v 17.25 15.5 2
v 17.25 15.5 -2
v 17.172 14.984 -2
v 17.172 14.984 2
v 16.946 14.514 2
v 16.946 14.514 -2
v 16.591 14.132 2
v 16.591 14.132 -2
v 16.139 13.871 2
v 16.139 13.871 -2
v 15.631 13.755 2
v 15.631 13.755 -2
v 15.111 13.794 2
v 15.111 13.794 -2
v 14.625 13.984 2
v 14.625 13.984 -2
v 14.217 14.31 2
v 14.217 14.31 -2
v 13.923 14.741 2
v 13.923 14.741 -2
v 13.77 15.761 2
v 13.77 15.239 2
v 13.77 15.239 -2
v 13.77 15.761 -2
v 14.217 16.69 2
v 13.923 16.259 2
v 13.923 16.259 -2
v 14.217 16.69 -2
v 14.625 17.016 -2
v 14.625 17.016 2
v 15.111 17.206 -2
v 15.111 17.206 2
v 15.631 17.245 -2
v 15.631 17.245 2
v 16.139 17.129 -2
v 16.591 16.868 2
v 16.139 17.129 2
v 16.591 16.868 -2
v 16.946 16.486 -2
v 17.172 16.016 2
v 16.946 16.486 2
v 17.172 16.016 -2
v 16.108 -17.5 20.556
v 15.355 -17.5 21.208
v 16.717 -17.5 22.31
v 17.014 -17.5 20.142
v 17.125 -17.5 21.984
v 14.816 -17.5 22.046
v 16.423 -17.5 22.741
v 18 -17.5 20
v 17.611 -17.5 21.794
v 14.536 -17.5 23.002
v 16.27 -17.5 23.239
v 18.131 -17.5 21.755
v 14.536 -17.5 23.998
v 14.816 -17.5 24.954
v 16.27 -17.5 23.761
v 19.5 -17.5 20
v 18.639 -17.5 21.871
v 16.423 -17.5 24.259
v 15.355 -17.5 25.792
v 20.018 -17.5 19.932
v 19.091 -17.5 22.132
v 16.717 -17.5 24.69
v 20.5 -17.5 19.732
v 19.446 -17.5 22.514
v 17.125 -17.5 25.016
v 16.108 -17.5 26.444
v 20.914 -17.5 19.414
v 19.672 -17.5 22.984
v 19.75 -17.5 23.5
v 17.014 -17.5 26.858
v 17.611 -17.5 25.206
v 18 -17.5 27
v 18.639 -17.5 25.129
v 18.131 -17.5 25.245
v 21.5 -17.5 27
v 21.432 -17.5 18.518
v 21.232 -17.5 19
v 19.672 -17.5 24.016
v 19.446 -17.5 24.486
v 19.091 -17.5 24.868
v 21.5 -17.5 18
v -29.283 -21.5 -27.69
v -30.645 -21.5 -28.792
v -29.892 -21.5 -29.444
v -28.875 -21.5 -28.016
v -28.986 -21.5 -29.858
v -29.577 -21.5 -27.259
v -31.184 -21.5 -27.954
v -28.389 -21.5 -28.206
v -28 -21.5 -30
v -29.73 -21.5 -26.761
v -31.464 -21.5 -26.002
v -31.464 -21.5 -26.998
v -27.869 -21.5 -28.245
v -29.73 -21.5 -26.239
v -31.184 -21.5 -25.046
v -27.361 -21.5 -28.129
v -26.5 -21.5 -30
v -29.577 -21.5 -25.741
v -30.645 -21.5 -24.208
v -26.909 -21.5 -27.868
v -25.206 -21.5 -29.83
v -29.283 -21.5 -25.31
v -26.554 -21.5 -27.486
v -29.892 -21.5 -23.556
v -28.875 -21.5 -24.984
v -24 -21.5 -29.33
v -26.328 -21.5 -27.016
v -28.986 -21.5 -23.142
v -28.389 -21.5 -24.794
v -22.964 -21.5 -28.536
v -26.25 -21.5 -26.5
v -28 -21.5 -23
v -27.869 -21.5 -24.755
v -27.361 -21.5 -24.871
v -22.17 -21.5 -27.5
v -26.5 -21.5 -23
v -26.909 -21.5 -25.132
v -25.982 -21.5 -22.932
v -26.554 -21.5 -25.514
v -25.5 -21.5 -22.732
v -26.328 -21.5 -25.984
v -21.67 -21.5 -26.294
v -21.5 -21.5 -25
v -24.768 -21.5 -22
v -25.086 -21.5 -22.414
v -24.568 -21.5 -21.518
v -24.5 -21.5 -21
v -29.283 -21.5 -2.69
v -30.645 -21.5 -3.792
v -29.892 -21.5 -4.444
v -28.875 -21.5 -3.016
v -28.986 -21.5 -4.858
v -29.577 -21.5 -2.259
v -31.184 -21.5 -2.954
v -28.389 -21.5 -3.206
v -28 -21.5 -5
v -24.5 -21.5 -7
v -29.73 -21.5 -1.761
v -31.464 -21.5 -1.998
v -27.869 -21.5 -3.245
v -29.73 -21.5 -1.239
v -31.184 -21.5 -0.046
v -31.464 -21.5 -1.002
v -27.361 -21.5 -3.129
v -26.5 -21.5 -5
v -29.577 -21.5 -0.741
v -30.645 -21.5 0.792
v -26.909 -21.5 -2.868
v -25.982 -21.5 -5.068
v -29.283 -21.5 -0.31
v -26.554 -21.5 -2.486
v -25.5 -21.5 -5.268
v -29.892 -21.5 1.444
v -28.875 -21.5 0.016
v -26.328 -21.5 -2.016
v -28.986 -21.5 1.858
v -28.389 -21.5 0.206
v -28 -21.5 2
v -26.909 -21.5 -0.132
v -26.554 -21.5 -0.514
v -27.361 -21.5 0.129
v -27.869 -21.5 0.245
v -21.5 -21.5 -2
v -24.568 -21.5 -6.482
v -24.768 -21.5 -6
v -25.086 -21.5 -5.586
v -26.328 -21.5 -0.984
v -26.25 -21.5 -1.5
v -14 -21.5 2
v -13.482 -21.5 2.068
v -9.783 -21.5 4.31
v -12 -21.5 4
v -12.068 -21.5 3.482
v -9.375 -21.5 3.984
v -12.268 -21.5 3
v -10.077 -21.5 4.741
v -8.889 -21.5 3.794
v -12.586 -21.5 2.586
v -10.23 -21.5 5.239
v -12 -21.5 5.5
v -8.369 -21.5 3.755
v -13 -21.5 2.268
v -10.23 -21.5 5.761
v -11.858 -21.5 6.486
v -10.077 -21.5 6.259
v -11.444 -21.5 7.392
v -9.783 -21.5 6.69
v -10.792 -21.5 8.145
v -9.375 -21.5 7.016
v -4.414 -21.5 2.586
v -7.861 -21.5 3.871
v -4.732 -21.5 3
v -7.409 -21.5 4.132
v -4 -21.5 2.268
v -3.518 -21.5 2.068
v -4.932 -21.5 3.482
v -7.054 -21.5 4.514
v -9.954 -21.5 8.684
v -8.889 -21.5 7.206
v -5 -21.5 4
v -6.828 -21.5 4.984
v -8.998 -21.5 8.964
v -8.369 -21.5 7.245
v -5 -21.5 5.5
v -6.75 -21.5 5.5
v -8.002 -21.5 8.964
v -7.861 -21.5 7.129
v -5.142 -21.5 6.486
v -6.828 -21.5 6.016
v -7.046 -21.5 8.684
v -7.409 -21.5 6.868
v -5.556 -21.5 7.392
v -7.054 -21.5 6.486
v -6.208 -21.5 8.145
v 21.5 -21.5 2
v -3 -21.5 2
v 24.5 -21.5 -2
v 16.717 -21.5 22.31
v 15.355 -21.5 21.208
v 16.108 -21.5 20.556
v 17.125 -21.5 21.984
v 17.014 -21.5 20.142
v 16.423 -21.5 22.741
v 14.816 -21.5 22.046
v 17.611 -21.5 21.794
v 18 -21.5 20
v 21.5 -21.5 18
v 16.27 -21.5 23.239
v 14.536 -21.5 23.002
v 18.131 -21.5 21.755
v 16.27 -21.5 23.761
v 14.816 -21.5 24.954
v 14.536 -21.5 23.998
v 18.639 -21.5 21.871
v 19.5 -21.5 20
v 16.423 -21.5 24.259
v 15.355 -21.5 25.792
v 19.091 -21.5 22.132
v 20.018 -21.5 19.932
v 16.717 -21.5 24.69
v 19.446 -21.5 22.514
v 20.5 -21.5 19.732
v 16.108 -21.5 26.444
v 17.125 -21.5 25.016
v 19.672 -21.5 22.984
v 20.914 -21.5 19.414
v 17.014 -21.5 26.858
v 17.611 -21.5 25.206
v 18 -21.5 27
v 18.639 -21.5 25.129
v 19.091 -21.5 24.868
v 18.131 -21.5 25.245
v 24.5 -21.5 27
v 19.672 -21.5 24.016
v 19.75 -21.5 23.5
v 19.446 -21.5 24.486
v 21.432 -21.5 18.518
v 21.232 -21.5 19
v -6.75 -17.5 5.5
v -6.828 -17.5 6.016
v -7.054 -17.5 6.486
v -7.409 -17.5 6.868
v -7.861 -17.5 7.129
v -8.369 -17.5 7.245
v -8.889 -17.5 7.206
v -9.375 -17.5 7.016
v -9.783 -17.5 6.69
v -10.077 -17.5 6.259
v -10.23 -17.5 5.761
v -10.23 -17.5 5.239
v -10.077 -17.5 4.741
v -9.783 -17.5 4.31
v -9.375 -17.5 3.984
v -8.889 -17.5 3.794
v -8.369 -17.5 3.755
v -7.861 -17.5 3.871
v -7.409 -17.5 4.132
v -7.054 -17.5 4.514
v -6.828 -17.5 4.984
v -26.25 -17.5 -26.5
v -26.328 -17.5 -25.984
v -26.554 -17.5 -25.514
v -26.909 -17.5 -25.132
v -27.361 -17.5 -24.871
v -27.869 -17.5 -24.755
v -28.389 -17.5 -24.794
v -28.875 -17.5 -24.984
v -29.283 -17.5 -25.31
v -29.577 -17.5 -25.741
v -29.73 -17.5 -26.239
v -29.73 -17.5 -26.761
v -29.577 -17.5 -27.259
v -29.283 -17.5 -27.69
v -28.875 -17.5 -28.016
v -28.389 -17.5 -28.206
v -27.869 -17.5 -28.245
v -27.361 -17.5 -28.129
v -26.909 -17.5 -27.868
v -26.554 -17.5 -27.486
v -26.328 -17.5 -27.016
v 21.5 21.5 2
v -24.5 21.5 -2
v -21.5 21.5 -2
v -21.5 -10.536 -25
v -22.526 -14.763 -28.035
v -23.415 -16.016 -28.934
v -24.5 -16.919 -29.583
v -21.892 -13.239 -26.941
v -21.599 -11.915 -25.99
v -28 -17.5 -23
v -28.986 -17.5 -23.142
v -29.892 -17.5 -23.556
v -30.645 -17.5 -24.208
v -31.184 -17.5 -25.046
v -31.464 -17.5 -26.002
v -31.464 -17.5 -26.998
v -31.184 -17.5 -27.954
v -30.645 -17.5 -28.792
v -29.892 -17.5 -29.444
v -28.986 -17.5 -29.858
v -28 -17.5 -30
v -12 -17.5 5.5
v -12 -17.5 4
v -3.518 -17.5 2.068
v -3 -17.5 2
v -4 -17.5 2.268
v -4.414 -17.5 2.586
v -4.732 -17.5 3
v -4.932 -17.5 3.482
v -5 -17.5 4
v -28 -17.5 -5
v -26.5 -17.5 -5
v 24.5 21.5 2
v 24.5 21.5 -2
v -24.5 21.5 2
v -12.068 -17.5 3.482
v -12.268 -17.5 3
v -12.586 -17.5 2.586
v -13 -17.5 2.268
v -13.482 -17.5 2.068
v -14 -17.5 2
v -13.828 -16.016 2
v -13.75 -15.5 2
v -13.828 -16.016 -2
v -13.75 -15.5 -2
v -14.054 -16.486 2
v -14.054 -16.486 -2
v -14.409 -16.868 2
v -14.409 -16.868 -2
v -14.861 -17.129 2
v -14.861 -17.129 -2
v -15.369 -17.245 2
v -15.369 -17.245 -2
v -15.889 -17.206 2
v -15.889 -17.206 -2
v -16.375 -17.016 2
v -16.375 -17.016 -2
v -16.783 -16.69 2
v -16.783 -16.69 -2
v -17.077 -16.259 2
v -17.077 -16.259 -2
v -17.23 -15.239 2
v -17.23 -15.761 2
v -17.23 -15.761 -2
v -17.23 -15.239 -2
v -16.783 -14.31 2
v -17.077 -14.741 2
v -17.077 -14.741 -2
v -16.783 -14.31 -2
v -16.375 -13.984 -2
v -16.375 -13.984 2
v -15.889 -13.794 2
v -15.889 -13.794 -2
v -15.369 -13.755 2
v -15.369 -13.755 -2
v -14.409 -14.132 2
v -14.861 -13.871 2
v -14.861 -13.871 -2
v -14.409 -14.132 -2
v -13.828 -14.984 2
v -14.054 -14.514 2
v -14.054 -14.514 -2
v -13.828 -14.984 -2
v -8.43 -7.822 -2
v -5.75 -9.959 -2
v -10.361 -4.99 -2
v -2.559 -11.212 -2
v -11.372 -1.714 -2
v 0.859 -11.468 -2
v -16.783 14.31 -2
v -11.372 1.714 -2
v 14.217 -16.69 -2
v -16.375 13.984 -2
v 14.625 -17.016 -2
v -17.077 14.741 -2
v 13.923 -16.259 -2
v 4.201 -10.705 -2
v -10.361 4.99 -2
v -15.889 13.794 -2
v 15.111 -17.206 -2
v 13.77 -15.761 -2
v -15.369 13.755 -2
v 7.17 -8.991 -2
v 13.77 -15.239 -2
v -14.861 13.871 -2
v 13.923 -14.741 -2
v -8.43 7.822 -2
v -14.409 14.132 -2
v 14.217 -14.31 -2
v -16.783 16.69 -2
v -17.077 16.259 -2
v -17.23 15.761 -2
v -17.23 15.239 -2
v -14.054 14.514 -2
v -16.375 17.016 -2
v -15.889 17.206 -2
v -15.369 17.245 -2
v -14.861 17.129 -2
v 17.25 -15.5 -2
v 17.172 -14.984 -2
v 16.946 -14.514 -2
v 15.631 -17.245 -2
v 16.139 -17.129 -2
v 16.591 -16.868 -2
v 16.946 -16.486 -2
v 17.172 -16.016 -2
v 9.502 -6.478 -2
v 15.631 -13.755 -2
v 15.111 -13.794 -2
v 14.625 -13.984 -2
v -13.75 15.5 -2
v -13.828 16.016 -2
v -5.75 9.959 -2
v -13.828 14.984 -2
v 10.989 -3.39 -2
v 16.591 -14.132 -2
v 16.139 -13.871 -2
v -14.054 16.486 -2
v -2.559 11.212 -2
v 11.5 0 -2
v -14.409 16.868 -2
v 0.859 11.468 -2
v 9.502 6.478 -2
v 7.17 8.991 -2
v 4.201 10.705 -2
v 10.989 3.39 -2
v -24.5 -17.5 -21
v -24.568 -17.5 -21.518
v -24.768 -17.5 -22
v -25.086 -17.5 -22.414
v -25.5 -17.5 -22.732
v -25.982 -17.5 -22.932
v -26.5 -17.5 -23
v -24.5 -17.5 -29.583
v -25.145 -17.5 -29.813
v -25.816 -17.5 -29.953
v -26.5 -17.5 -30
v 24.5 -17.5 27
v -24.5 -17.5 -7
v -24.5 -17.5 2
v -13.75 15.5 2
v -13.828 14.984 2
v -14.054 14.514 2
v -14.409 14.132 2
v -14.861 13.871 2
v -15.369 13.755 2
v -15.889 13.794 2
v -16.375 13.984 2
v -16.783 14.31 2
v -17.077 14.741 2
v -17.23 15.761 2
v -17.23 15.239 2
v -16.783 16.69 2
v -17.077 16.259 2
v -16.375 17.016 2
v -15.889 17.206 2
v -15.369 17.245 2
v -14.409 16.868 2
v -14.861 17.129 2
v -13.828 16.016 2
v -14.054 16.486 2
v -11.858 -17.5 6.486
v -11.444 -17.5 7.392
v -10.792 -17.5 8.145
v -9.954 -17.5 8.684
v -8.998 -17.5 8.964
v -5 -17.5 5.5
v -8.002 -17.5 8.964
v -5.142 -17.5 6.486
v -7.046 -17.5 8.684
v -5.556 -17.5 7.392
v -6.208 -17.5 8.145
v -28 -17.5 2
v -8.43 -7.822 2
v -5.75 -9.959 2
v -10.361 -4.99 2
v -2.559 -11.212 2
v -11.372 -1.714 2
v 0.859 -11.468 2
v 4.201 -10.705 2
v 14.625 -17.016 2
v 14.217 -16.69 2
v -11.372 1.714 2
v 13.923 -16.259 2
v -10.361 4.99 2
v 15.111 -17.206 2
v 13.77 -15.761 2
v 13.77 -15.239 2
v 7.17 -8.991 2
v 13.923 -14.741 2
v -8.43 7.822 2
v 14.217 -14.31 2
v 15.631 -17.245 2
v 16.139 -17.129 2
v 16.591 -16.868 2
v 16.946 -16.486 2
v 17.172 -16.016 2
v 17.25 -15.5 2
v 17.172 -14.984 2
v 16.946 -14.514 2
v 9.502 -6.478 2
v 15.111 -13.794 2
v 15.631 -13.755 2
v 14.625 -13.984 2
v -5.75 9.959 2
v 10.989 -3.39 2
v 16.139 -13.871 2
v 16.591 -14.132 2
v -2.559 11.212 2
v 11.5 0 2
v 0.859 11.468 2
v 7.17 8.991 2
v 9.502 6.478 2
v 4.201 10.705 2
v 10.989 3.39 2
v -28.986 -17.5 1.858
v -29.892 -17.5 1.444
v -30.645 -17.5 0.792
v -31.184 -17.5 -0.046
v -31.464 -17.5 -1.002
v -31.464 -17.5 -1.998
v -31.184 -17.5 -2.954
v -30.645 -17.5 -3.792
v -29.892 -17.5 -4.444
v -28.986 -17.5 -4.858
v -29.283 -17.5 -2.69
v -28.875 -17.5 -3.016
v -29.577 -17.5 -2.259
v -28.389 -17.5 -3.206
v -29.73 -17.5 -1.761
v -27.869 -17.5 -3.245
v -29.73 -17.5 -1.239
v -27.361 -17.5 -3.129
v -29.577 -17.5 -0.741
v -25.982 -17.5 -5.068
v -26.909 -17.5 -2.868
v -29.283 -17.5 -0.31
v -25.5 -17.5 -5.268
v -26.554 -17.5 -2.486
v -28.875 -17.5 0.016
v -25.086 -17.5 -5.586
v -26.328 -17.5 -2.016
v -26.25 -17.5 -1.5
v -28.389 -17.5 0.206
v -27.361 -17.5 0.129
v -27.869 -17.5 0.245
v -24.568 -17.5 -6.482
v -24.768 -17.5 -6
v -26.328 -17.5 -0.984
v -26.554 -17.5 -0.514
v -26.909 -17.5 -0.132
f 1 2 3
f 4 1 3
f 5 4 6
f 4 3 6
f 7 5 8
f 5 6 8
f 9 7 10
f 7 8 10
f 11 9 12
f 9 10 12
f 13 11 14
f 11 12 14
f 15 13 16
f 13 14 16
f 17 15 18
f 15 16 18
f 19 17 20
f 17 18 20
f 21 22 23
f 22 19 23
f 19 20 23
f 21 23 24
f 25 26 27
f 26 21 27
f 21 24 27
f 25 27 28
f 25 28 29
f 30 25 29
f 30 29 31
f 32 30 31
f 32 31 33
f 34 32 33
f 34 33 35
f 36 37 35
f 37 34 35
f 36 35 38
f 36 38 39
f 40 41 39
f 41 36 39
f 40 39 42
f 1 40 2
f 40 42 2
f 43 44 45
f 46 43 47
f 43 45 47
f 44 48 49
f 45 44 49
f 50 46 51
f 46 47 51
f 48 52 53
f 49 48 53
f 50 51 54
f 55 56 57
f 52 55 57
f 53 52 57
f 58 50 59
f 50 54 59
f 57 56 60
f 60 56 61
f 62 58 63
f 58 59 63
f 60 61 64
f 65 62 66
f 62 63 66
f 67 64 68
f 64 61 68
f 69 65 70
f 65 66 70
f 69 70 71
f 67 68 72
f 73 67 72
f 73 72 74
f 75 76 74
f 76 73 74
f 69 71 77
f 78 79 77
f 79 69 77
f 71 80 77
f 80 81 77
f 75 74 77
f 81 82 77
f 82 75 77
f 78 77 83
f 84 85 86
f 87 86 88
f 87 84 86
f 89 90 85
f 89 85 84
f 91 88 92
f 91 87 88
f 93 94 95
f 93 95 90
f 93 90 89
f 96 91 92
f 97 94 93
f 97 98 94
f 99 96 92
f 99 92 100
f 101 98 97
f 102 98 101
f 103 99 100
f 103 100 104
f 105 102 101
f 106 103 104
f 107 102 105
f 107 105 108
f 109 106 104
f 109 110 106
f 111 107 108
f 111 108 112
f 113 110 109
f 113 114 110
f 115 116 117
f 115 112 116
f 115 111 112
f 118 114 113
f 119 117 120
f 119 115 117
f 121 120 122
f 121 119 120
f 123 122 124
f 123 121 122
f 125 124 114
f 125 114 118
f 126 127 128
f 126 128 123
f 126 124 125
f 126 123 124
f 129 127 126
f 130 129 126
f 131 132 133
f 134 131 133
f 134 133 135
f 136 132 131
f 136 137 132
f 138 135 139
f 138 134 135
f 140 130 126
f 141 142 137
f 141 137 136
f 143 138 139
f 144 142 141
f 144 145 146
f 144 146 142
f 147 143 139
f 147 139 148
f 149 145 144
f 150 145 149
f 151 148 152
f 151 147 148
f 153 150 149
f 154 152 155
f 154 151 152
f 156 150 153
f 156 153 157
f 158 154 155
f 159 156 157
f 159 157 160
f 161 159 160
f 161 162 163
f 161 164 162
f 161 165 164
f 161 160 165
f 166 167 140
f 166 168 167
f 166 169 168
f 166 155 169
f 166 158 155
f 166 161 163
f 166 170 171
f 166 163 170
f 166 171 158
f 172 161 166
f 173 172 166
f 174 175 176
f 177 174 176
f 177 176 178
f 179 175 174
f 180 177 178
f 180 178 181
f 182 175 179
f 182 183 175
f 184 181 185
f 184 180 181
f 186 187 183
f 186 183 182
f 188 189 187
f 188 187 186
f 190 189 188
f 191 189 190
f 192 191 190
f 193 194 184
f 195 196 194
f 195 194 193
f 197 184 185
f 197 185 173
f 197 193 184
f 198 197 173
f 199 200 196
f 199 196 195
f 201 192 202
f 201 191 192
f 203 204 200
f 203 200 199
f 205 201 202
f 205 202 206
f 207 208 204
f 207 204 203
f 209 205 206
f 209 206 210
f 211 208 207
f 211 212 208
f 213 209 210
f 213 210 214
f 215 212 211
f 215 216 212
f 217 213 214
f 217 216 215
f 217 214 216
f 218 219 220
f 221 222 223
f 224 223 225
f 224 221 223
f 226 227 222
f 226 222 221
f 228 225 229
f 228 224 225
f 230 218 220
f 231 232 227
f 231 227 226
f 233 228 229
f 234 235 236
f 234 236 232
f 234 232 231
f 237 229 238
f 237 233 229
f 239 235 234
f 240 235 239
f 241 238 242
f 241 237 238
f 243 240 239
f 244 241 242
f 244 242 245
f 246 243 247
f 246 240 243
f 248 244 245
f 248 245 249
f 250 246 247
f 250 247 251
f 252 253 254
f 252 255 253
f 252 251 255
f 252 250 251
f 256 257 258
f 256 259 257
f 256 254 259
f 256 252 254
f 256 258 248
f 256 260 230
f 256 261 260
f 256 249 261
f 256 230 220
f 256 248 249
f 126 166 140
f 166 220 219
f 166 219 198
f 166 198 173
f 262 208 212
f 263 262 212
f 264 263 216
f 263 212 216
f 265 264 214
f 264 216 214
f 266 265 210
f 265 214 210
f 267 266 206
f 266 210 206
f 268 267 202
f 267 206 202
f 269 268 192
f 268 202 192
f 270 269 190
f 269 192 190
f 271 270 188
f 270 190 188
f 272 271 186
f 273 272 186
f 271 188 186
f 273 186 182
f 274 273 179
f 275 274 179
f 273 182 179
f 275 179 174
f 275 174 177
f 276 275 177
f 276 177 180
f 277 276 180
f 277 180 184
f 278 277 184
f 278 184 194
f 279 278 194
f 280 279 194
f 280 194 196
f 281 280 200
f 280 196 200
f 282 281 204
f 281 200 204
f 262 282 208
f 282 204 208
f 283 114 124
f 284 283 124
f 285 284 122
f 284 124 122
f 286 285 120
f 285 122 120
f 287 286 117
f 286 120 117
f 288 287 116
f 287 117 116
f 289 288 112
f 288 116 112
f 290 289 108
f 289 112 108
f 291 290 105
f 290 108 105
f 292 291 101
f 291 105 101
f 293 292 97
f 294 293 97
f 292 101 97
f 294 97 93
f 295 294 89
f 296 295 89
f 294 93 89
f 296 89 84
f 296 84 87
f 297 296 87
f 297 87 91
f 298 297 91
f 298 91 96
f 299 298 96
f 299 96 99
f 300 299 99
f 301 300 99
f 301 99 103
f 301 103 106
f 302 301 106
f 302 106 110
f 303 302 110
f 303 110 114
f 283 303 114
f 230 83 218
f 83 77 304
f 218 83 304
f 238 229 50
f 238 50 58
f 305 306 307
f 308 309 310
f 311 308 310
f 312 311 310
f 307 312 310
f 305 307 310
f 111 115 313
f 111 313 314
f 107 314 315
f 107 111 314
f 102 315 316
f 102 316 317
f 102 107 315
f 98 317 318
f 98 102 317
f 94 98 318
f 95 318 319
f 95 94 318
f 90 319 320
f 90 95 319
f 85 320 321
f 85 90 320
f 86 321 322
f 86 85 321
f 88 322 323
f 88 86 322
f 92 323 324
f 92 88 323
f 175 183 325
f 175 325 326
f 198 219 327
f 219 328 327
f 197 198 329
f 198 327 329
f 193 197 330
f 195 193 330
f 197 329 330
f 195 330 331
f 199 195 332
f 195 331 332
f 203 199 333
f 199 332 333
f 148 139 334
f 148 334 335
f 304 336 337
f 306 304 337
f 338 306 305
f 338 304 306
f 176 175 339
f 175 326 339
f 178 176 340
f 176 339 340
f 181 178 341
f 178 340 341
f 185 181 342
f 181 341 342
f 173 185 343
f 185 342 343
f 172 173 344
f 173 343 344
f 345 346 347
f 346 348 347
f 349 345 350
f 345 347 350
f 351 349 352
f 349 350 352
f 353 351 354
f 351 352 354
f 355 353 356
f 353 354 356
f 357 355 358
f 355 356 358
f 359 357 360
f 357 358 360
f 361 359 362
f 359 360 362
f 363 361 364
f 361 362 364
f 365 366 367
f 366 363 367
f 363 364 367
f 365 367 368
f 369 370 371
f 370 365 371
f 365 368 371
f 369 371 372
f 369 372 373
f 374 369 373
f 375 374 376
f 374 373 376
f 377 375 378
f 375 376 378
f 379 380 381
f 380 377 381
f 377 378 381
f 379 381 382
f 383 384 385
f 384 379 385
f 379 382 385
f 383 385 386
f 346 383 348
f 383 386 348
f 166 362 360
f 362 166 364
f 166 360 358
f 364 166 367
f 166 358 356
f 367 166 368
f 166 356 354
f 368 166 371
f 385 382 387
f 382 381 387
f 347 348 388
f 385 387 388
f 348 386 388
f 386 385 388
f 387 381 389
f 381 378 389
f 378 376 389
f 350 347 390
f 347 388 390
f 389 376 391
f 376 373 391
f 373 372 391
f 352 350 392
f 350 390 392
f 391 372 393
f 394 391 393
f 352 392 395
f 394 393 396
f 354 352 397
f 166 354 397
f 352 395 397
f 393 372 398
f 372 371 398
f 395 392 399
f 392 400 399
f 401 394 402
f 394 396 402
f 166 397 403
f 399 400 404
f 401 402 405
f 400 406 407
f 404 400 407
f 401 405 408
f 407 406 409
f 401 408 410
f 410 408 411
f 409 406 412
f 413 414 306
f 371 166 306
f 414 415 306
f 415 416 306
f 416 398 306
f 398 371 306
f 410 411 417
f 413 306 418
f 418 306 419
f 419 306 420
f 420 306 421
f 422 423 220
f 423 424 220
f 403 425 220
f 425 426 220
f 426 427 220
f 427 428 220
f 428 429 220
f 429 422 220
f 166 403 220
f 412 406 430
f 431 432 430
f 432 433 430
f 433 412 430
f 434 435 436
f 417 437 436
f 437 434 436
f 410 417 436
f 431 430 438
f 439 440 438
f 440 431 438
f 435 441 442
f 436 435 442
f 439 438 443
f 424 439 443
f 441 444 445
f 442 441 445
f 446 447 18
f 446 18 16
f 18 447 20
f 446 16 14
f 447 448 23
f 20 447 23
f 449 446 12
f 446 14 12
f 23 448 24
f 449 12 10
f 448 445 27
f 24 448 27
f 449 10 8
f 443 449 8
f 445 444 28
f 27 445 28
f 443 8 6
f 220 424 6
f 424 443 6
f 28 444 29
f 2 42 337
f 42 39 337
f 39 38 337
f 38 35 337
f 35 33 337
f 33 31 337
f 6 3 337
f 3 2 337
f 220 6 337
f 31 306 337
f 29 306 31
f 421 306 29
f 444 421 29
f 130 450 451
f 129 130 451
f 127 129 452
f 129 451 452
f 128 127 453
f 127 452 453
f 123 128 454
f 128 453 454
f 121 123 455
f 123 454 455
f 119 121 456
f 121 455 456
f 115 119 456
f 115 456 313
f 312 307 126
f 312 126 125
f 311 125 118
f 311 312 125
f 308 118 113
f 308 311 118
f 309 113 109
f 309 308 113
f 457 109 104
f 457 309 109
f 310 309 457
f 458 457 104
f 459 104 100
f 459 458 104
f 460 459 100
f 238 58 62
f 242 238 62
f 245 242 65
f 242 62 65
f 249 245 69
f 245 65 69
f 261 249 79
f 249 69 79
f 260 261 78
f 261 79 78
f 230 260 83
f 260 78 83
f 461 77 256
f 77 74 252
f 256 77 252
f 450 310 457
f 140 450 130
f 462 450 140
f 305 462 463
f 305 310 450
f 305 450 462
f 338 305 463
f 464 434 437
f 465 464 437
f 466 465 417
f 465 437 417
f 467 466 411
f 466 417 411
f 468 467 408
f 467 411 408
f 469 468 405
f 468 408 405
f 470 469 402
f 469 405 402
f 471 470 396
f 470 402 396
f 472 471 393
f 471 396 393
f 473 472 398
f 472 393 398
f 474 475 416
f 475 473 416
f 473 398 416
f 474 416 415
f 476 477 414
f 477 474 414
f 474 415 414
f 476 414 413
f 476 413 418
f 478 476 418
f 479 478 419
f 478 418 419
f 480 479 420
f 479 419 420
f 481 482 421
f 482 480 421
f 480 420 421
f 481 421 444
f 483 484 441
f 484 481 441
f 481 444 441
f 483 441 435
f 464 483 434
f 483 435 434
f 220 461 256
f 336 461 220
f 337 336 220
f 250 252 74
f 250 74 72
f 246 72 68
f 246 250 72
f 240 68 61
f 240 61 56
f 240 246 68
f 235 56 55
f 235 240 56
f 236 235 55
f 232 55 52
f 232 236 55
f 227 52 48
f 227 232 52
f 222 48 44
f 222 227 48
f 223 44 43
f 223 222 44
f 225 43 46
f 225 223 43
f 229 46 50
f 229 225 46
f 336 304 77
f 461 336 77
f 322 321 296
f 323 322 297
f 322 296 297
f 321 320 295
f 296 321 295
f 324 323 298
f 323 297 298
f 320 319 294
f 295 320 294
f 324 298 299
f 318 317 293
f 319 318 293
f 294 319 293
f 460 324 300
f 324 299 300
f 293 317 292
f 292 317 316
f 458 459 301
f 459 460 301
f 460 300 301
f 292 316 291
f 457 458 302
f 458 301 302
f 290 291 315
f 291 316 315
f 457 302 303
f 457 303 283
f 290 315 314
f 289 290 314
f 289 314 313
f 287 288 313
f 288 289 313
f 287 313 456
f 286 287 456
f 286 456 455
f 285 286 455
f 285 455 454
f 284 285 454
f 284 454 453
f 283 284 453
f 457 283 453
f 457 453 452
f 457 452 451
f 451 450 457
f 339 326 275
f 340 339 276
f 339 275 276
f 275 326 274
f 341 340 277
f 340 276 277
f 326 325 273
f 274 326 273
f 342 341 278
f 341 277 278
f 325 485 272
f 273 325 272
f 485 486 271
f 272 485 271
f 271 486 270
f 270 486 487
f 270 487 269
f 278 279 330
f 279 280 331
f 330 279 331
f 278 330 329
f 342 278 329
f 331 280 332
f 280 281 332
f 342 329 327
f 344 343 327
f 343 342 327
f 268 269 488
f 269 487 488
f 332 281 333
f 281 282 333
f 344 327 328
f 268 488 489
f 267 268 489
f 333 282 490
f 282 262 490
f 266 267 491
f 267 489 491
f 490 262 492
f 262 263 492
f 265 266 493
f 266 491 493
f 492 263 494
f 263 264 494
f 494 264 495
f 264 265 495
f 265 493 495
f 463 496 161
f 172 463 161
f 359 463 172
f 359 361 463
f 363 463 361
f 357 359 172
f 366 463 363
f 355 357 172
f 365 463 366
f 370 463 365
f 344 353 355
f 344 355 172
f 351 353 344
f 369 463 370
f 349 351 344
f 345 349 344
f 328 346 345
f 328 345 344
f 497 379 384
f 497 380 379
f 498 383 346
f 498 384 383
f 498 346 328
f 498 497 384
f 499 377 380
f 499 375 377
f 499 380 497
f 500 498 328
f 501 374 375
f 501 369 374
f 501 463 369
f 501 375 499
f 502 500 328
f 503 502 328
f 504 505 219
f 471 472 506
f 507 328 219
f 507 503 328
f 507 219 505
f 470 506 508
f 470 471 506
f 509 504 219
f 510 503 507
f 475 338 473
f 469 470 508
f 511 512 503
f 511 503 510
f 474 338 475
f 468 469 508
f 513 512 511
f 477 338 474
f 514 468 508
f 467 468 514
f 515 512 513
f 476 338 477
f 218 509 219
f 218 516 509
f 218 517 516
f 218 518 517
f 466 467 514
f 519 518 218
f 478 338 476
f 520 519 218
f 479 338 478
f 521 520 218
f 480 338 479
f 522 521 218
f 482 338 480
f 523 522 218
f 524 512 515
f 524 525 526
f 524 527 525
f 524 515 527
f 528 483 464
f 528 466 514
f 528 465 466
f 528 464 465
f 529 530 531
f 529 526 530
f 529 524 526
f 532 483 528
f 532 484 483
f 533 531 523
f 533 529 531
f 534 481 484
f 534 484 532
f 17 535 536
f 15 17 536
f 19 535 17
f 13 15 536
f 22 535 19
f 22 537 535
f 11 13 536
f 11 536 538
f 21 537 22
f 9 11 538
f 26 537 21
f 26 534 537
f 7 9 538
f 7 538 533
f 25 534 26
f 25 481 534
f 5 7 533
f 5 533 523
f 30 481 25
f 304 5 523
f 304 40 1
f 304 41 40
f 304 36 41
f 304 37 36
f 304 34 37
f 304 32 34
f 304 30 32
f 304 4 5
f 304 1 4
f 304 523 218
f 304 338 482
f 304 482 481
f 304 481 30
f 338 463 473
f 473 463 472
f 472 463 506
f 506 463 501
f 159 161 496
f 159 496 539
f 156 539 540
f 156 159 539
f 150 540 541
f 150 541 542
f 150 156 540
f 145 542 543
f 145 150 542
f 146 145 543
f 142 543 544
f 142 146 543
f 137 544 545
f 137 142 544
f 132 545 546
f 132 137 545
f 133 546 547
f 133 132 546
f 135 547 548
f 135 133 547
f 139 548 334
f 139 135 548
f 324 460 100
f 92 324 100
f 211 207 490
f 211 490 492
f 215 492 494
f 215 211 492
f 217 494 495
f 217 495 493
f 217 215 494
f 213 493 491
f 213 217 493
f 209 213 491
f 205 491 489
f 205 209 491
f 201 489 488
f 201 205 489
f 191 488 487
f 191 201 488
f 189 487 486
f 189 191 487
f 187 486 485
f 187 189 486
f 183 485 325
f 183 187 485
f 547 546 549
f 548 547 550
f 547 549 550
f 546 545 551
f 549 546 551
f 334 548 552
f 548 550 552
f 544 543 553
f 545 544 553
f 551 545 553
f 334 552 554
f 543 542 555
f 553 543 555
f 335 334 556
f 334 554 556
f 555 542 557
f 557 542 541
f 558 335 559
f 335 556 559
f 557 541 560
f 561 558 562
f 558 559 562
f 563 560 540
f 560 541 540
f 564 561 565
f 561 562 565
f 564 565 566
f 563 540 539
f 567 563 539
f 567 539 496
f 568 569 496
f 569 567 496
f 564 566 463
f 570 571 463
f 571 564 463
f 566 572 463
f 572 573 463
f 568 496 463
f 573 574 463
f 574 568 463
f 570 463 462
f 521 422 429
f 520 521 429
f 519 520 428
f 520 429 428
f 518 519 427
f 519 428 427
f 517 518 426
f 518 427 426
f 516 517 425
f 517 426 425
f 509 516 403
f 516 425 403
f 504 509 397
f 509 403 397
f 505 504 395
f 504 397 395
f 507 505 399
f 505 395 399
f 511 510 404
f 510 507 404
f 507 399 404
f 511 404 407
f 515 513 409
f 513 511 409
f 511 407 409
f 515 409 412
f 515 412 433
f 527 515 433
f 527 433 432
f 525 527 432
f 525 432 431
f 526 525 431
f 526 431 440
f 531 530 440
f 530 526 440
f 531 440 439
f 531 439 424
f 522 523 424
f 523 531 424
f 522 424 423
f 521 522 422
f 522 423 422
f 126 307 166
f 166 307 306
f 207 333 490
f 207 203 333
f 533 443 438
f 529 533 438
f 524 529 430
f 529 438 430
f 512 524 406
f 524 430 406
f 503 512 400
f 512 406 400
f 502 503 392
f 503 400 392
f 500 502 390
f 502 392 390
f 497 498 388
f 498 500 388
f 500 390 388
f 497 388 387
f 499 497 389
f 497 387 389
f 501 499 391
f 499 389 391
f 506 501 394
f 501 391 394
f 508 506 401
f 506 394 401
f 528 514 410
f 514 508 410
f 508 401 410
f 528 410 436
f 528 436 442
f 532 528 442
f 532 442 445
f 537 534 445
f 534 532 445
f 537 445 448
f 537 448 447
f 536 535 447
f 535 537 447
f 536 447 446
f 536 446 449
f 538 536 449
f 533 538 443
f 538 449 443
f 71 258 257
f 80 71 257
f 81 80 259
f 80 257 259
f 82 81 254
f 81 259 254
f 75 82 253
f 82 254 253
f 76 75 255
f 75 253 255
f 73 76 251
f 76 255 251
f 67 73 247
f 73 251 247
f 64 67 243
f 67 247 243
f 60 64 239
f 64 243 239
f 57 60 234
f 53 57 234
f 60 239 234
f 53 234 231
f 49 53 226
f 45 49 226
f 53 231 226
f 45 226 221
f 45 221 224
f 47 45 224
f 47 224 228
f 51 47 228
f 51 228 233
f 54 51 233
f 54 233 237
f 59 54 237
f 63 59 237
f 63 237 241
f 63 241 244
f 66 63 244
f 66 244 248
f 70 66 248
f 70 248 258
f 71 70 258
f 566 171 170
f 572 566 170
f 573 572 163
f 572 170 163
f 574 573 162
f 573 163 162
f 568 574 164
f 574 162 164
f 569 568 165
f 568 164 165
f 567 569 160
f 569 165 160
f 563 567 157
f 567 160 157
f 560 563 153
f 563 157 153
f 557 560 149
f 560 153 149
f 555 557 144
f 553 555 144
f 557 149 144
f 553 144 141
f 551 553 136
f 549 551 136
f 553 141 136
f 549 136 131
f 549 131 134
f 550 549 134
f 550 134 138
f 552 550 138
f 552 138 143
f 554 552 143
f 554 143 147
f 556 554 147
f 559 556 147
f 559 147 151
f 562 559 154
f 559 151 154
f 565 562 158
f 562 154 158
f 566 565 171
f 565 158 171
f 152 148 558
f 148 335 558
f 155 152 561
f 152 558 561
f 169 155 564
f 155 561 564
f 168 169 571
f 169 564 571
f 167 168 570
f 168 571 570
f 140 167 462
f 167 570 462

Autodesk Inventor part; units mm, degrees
ref_plane "YZ Plane" through (0, 0, 0) normal (1, 0, 0) x (0, 1, 0)
ref_plane "XZ Plane" through (0, 0, 0) normal (0, 1, 0) x (-1, 0, 0)
ref_plane "XY Plane" through (0, 0, 0) normal (0, 0, 1) x (1, 0, 0)
sketch "Sketch1" plane through (0, 0, 0) normal (0, 0, 1) x (1, 0, 0)
  line L0 (-15.5, 15.5) -> (15.5, 15.5) construction
  line L1 (15.5, 15.5) -> (15.5, -15.5) construction
  line L2 (15.5, -15.5) -> (-15.5, -15.5) construction
  line L3 (-15.5, -15.5) -> (-15.5, 15.5) construction
  line L4 (-15.5, 15.5) -> (15.5, -15.5) construction
  line L5 (15.5, 15.5) -> (-15.5, -15.5) construction
  circle A0 centre (0, 0) radius 11.5
  circle A1 centre (15.5, 15.5) radius 1.75
  circle A2 centre (15.5, -15.5) radius 1.75
  circle A3 centre (-15.5, -15.5) radius 1.75
  circle A4 centre (-15.5, 15.5) radius 1.75
  line L6 (-21.5, -21.5) -> (21.5, -21.5)
  line L7 (21.5, -21.5) -> (21.5, 21.5)
  line L8 (21.5, 21.5) -> (-21.5, 21.5)
  line L9 (-21.5, 21.5) -> (-21.5, -21.5)
  line L10 (-21.5, -21.5) -> (21.5, 21.5) construction
  line L11 (21.5, -21.5) -> (-21.5, 21.5) construction
  dimension "d0" = 23
  dimension "d1" = 3.5
  dimension "d2" = 31
  dimension "d3" = 31
  dimension "d4" = 43
extrude "Extrusion1" add sketch "Sketch1" against normal mid plane 4
sketch "Sketch2" plane through (-21.5, -21.5, -2) normal (-1, 0, 0) x (0, 0, 1)
  line L0 (0, 43) -> (4, 43) projected
  line L1 (0, 0) -> (0, 43) projected
  line L2 (0, 0) -> (4, 0) projected
  line L3 (4, 43) -> (4, 0) projected
  line L4 (0, 43) -> (4, 43) projected
  line L5 (0, 43) -> (-28, 4)
  line L6 (-28, 4) -> (-28, 0)
  line L7 (0, 43) -> (0, 0) projected
  line L8 (-28, 0) -> (0, 0)
  point P0 (2, 21.5)
  dimension "d7" = 28
  dimension "d8" = 4
extrude "Extrusion2" add sketch "Sketch2" along normal blind 3
sketch "Sketch3" plane through (21.5, -21.5, -2) normal (1, 0, 0) x (0, 0, -1)
  line L0 (-4, 0) -> (0, 0) projected
  line L1 (0, 43) -> (0, 0) projected
  line L2 (0, 43) -> (-4, 43) projected
  line L3 (-4, 0) -> (-4, 43) projected
  line L4 (-4, 0) -> (-4, 43) projected
  line L5 (-4, 43) -> (-29, 4)
  line L6 (-29, 4) -> (-29, 0)
  line L7 (-29, 0) -> (-4, 0)
  point P0 (-2, 21.5)
  dimension "d11" = 4
  dimension "d12" = 25
extrude "Extrusion3" add sketch "Sketch3" along normal blind 3
sketch "Sketch4" plane through (-21.5, -21.5, -30) normal (0, -1, 0) x (1, 0, 0)
  arc A0 (39.5, 57) -> (39.5, 50) centre (39.5, 53.5) ccw
  line L0 (43, 32) -> (43, 57) projected
  line L1 (43, 57) -> (39.5, 57)
  line L2 (39.5, 50) -> (43, 50)
  line L3 (39.5, 50) -> (39.5, 57) construction
  circle A1 centre (39.5, 53.5) radius 1.75
  arc A2 (-6.5, 32) -> (-6.5, 25) centre (-6.5, 28.5) ccw
  line L4 (-3, 32) -> (-6.5, 32)
  line L5 (-6.5, 25) -> (-3, 25)
  line L6 (-6.5, 25) -> (-6.5, 32) construction
  circle A3 centre (-6.5, 28.5) radius 1.75
  arc A4 (-6.5, 7) -> (-6.5, 0) centre (-6.5, 3.5) ccw
  line L7 (-3, 7) -> (-6.5, 7)
  line L8 (-6.5, 0) -> (-3, 0)
  line L9 (-6.5, 0) -> (-6.5, 7) construction
  circle A5 centre (-6.5, 3.5) radius 1.75
  line L10 (-3, 0) -> (-3, 32) projected
  arc A6 (16.5, 35.5) -> (9.5, 35.5) centre (13, 35.5) ccw
  line L11 (16.5, 32) -> (16.5, 35.5)
  line L12 (9.5, 35.5) -> (9.5, 32)
  line L13 (9.5, 35.5) -> (16.5, 35.5) construction
  circle A7 centre (13, 35.5) radius 1.75
  line L14 (43, 32) -> (-3, 32) projected
  line L15 (0, 28) -> (46, 28) projected
  line L16 (46, 32) -> (46, 57) projected
  point P0 (21.5, 30)
  dimension "d15" = 3.5
  dimension "d16" = 3.5
  dimension "d19" = 3.5
  dimension "d20" = 3.5
  dimension "d21" = 3.5
  dimension "d22" = 3.5
  dimension "d23" = 3.5
  dimension "d24" = 3.5
  dimension "d25" = 16
  dimension "d27" = 25.5
  dimension "d28" = 6.5
  dimension "d31" = 26.5
  dimension "d32" = 19.5
  dimension "d33" = 18
  dimension "d34" = 7
  dimension "d35" = 25
extrude "Extrusion4" add sketch "Sketch4" against normal blind 4
fillet "Fillet1" radius 2 5 edges at (-24.5, -19.5, -23) (-12, -19.5, 2) (-24.5, -19.5, -5) (-5, -19.5, 2) (21.5, -19.5, 20)
fillet "Fillet2" radius 5 1 edges at (-21.5, -19.5, -30)
properties part number "PitchMotorBracket"
